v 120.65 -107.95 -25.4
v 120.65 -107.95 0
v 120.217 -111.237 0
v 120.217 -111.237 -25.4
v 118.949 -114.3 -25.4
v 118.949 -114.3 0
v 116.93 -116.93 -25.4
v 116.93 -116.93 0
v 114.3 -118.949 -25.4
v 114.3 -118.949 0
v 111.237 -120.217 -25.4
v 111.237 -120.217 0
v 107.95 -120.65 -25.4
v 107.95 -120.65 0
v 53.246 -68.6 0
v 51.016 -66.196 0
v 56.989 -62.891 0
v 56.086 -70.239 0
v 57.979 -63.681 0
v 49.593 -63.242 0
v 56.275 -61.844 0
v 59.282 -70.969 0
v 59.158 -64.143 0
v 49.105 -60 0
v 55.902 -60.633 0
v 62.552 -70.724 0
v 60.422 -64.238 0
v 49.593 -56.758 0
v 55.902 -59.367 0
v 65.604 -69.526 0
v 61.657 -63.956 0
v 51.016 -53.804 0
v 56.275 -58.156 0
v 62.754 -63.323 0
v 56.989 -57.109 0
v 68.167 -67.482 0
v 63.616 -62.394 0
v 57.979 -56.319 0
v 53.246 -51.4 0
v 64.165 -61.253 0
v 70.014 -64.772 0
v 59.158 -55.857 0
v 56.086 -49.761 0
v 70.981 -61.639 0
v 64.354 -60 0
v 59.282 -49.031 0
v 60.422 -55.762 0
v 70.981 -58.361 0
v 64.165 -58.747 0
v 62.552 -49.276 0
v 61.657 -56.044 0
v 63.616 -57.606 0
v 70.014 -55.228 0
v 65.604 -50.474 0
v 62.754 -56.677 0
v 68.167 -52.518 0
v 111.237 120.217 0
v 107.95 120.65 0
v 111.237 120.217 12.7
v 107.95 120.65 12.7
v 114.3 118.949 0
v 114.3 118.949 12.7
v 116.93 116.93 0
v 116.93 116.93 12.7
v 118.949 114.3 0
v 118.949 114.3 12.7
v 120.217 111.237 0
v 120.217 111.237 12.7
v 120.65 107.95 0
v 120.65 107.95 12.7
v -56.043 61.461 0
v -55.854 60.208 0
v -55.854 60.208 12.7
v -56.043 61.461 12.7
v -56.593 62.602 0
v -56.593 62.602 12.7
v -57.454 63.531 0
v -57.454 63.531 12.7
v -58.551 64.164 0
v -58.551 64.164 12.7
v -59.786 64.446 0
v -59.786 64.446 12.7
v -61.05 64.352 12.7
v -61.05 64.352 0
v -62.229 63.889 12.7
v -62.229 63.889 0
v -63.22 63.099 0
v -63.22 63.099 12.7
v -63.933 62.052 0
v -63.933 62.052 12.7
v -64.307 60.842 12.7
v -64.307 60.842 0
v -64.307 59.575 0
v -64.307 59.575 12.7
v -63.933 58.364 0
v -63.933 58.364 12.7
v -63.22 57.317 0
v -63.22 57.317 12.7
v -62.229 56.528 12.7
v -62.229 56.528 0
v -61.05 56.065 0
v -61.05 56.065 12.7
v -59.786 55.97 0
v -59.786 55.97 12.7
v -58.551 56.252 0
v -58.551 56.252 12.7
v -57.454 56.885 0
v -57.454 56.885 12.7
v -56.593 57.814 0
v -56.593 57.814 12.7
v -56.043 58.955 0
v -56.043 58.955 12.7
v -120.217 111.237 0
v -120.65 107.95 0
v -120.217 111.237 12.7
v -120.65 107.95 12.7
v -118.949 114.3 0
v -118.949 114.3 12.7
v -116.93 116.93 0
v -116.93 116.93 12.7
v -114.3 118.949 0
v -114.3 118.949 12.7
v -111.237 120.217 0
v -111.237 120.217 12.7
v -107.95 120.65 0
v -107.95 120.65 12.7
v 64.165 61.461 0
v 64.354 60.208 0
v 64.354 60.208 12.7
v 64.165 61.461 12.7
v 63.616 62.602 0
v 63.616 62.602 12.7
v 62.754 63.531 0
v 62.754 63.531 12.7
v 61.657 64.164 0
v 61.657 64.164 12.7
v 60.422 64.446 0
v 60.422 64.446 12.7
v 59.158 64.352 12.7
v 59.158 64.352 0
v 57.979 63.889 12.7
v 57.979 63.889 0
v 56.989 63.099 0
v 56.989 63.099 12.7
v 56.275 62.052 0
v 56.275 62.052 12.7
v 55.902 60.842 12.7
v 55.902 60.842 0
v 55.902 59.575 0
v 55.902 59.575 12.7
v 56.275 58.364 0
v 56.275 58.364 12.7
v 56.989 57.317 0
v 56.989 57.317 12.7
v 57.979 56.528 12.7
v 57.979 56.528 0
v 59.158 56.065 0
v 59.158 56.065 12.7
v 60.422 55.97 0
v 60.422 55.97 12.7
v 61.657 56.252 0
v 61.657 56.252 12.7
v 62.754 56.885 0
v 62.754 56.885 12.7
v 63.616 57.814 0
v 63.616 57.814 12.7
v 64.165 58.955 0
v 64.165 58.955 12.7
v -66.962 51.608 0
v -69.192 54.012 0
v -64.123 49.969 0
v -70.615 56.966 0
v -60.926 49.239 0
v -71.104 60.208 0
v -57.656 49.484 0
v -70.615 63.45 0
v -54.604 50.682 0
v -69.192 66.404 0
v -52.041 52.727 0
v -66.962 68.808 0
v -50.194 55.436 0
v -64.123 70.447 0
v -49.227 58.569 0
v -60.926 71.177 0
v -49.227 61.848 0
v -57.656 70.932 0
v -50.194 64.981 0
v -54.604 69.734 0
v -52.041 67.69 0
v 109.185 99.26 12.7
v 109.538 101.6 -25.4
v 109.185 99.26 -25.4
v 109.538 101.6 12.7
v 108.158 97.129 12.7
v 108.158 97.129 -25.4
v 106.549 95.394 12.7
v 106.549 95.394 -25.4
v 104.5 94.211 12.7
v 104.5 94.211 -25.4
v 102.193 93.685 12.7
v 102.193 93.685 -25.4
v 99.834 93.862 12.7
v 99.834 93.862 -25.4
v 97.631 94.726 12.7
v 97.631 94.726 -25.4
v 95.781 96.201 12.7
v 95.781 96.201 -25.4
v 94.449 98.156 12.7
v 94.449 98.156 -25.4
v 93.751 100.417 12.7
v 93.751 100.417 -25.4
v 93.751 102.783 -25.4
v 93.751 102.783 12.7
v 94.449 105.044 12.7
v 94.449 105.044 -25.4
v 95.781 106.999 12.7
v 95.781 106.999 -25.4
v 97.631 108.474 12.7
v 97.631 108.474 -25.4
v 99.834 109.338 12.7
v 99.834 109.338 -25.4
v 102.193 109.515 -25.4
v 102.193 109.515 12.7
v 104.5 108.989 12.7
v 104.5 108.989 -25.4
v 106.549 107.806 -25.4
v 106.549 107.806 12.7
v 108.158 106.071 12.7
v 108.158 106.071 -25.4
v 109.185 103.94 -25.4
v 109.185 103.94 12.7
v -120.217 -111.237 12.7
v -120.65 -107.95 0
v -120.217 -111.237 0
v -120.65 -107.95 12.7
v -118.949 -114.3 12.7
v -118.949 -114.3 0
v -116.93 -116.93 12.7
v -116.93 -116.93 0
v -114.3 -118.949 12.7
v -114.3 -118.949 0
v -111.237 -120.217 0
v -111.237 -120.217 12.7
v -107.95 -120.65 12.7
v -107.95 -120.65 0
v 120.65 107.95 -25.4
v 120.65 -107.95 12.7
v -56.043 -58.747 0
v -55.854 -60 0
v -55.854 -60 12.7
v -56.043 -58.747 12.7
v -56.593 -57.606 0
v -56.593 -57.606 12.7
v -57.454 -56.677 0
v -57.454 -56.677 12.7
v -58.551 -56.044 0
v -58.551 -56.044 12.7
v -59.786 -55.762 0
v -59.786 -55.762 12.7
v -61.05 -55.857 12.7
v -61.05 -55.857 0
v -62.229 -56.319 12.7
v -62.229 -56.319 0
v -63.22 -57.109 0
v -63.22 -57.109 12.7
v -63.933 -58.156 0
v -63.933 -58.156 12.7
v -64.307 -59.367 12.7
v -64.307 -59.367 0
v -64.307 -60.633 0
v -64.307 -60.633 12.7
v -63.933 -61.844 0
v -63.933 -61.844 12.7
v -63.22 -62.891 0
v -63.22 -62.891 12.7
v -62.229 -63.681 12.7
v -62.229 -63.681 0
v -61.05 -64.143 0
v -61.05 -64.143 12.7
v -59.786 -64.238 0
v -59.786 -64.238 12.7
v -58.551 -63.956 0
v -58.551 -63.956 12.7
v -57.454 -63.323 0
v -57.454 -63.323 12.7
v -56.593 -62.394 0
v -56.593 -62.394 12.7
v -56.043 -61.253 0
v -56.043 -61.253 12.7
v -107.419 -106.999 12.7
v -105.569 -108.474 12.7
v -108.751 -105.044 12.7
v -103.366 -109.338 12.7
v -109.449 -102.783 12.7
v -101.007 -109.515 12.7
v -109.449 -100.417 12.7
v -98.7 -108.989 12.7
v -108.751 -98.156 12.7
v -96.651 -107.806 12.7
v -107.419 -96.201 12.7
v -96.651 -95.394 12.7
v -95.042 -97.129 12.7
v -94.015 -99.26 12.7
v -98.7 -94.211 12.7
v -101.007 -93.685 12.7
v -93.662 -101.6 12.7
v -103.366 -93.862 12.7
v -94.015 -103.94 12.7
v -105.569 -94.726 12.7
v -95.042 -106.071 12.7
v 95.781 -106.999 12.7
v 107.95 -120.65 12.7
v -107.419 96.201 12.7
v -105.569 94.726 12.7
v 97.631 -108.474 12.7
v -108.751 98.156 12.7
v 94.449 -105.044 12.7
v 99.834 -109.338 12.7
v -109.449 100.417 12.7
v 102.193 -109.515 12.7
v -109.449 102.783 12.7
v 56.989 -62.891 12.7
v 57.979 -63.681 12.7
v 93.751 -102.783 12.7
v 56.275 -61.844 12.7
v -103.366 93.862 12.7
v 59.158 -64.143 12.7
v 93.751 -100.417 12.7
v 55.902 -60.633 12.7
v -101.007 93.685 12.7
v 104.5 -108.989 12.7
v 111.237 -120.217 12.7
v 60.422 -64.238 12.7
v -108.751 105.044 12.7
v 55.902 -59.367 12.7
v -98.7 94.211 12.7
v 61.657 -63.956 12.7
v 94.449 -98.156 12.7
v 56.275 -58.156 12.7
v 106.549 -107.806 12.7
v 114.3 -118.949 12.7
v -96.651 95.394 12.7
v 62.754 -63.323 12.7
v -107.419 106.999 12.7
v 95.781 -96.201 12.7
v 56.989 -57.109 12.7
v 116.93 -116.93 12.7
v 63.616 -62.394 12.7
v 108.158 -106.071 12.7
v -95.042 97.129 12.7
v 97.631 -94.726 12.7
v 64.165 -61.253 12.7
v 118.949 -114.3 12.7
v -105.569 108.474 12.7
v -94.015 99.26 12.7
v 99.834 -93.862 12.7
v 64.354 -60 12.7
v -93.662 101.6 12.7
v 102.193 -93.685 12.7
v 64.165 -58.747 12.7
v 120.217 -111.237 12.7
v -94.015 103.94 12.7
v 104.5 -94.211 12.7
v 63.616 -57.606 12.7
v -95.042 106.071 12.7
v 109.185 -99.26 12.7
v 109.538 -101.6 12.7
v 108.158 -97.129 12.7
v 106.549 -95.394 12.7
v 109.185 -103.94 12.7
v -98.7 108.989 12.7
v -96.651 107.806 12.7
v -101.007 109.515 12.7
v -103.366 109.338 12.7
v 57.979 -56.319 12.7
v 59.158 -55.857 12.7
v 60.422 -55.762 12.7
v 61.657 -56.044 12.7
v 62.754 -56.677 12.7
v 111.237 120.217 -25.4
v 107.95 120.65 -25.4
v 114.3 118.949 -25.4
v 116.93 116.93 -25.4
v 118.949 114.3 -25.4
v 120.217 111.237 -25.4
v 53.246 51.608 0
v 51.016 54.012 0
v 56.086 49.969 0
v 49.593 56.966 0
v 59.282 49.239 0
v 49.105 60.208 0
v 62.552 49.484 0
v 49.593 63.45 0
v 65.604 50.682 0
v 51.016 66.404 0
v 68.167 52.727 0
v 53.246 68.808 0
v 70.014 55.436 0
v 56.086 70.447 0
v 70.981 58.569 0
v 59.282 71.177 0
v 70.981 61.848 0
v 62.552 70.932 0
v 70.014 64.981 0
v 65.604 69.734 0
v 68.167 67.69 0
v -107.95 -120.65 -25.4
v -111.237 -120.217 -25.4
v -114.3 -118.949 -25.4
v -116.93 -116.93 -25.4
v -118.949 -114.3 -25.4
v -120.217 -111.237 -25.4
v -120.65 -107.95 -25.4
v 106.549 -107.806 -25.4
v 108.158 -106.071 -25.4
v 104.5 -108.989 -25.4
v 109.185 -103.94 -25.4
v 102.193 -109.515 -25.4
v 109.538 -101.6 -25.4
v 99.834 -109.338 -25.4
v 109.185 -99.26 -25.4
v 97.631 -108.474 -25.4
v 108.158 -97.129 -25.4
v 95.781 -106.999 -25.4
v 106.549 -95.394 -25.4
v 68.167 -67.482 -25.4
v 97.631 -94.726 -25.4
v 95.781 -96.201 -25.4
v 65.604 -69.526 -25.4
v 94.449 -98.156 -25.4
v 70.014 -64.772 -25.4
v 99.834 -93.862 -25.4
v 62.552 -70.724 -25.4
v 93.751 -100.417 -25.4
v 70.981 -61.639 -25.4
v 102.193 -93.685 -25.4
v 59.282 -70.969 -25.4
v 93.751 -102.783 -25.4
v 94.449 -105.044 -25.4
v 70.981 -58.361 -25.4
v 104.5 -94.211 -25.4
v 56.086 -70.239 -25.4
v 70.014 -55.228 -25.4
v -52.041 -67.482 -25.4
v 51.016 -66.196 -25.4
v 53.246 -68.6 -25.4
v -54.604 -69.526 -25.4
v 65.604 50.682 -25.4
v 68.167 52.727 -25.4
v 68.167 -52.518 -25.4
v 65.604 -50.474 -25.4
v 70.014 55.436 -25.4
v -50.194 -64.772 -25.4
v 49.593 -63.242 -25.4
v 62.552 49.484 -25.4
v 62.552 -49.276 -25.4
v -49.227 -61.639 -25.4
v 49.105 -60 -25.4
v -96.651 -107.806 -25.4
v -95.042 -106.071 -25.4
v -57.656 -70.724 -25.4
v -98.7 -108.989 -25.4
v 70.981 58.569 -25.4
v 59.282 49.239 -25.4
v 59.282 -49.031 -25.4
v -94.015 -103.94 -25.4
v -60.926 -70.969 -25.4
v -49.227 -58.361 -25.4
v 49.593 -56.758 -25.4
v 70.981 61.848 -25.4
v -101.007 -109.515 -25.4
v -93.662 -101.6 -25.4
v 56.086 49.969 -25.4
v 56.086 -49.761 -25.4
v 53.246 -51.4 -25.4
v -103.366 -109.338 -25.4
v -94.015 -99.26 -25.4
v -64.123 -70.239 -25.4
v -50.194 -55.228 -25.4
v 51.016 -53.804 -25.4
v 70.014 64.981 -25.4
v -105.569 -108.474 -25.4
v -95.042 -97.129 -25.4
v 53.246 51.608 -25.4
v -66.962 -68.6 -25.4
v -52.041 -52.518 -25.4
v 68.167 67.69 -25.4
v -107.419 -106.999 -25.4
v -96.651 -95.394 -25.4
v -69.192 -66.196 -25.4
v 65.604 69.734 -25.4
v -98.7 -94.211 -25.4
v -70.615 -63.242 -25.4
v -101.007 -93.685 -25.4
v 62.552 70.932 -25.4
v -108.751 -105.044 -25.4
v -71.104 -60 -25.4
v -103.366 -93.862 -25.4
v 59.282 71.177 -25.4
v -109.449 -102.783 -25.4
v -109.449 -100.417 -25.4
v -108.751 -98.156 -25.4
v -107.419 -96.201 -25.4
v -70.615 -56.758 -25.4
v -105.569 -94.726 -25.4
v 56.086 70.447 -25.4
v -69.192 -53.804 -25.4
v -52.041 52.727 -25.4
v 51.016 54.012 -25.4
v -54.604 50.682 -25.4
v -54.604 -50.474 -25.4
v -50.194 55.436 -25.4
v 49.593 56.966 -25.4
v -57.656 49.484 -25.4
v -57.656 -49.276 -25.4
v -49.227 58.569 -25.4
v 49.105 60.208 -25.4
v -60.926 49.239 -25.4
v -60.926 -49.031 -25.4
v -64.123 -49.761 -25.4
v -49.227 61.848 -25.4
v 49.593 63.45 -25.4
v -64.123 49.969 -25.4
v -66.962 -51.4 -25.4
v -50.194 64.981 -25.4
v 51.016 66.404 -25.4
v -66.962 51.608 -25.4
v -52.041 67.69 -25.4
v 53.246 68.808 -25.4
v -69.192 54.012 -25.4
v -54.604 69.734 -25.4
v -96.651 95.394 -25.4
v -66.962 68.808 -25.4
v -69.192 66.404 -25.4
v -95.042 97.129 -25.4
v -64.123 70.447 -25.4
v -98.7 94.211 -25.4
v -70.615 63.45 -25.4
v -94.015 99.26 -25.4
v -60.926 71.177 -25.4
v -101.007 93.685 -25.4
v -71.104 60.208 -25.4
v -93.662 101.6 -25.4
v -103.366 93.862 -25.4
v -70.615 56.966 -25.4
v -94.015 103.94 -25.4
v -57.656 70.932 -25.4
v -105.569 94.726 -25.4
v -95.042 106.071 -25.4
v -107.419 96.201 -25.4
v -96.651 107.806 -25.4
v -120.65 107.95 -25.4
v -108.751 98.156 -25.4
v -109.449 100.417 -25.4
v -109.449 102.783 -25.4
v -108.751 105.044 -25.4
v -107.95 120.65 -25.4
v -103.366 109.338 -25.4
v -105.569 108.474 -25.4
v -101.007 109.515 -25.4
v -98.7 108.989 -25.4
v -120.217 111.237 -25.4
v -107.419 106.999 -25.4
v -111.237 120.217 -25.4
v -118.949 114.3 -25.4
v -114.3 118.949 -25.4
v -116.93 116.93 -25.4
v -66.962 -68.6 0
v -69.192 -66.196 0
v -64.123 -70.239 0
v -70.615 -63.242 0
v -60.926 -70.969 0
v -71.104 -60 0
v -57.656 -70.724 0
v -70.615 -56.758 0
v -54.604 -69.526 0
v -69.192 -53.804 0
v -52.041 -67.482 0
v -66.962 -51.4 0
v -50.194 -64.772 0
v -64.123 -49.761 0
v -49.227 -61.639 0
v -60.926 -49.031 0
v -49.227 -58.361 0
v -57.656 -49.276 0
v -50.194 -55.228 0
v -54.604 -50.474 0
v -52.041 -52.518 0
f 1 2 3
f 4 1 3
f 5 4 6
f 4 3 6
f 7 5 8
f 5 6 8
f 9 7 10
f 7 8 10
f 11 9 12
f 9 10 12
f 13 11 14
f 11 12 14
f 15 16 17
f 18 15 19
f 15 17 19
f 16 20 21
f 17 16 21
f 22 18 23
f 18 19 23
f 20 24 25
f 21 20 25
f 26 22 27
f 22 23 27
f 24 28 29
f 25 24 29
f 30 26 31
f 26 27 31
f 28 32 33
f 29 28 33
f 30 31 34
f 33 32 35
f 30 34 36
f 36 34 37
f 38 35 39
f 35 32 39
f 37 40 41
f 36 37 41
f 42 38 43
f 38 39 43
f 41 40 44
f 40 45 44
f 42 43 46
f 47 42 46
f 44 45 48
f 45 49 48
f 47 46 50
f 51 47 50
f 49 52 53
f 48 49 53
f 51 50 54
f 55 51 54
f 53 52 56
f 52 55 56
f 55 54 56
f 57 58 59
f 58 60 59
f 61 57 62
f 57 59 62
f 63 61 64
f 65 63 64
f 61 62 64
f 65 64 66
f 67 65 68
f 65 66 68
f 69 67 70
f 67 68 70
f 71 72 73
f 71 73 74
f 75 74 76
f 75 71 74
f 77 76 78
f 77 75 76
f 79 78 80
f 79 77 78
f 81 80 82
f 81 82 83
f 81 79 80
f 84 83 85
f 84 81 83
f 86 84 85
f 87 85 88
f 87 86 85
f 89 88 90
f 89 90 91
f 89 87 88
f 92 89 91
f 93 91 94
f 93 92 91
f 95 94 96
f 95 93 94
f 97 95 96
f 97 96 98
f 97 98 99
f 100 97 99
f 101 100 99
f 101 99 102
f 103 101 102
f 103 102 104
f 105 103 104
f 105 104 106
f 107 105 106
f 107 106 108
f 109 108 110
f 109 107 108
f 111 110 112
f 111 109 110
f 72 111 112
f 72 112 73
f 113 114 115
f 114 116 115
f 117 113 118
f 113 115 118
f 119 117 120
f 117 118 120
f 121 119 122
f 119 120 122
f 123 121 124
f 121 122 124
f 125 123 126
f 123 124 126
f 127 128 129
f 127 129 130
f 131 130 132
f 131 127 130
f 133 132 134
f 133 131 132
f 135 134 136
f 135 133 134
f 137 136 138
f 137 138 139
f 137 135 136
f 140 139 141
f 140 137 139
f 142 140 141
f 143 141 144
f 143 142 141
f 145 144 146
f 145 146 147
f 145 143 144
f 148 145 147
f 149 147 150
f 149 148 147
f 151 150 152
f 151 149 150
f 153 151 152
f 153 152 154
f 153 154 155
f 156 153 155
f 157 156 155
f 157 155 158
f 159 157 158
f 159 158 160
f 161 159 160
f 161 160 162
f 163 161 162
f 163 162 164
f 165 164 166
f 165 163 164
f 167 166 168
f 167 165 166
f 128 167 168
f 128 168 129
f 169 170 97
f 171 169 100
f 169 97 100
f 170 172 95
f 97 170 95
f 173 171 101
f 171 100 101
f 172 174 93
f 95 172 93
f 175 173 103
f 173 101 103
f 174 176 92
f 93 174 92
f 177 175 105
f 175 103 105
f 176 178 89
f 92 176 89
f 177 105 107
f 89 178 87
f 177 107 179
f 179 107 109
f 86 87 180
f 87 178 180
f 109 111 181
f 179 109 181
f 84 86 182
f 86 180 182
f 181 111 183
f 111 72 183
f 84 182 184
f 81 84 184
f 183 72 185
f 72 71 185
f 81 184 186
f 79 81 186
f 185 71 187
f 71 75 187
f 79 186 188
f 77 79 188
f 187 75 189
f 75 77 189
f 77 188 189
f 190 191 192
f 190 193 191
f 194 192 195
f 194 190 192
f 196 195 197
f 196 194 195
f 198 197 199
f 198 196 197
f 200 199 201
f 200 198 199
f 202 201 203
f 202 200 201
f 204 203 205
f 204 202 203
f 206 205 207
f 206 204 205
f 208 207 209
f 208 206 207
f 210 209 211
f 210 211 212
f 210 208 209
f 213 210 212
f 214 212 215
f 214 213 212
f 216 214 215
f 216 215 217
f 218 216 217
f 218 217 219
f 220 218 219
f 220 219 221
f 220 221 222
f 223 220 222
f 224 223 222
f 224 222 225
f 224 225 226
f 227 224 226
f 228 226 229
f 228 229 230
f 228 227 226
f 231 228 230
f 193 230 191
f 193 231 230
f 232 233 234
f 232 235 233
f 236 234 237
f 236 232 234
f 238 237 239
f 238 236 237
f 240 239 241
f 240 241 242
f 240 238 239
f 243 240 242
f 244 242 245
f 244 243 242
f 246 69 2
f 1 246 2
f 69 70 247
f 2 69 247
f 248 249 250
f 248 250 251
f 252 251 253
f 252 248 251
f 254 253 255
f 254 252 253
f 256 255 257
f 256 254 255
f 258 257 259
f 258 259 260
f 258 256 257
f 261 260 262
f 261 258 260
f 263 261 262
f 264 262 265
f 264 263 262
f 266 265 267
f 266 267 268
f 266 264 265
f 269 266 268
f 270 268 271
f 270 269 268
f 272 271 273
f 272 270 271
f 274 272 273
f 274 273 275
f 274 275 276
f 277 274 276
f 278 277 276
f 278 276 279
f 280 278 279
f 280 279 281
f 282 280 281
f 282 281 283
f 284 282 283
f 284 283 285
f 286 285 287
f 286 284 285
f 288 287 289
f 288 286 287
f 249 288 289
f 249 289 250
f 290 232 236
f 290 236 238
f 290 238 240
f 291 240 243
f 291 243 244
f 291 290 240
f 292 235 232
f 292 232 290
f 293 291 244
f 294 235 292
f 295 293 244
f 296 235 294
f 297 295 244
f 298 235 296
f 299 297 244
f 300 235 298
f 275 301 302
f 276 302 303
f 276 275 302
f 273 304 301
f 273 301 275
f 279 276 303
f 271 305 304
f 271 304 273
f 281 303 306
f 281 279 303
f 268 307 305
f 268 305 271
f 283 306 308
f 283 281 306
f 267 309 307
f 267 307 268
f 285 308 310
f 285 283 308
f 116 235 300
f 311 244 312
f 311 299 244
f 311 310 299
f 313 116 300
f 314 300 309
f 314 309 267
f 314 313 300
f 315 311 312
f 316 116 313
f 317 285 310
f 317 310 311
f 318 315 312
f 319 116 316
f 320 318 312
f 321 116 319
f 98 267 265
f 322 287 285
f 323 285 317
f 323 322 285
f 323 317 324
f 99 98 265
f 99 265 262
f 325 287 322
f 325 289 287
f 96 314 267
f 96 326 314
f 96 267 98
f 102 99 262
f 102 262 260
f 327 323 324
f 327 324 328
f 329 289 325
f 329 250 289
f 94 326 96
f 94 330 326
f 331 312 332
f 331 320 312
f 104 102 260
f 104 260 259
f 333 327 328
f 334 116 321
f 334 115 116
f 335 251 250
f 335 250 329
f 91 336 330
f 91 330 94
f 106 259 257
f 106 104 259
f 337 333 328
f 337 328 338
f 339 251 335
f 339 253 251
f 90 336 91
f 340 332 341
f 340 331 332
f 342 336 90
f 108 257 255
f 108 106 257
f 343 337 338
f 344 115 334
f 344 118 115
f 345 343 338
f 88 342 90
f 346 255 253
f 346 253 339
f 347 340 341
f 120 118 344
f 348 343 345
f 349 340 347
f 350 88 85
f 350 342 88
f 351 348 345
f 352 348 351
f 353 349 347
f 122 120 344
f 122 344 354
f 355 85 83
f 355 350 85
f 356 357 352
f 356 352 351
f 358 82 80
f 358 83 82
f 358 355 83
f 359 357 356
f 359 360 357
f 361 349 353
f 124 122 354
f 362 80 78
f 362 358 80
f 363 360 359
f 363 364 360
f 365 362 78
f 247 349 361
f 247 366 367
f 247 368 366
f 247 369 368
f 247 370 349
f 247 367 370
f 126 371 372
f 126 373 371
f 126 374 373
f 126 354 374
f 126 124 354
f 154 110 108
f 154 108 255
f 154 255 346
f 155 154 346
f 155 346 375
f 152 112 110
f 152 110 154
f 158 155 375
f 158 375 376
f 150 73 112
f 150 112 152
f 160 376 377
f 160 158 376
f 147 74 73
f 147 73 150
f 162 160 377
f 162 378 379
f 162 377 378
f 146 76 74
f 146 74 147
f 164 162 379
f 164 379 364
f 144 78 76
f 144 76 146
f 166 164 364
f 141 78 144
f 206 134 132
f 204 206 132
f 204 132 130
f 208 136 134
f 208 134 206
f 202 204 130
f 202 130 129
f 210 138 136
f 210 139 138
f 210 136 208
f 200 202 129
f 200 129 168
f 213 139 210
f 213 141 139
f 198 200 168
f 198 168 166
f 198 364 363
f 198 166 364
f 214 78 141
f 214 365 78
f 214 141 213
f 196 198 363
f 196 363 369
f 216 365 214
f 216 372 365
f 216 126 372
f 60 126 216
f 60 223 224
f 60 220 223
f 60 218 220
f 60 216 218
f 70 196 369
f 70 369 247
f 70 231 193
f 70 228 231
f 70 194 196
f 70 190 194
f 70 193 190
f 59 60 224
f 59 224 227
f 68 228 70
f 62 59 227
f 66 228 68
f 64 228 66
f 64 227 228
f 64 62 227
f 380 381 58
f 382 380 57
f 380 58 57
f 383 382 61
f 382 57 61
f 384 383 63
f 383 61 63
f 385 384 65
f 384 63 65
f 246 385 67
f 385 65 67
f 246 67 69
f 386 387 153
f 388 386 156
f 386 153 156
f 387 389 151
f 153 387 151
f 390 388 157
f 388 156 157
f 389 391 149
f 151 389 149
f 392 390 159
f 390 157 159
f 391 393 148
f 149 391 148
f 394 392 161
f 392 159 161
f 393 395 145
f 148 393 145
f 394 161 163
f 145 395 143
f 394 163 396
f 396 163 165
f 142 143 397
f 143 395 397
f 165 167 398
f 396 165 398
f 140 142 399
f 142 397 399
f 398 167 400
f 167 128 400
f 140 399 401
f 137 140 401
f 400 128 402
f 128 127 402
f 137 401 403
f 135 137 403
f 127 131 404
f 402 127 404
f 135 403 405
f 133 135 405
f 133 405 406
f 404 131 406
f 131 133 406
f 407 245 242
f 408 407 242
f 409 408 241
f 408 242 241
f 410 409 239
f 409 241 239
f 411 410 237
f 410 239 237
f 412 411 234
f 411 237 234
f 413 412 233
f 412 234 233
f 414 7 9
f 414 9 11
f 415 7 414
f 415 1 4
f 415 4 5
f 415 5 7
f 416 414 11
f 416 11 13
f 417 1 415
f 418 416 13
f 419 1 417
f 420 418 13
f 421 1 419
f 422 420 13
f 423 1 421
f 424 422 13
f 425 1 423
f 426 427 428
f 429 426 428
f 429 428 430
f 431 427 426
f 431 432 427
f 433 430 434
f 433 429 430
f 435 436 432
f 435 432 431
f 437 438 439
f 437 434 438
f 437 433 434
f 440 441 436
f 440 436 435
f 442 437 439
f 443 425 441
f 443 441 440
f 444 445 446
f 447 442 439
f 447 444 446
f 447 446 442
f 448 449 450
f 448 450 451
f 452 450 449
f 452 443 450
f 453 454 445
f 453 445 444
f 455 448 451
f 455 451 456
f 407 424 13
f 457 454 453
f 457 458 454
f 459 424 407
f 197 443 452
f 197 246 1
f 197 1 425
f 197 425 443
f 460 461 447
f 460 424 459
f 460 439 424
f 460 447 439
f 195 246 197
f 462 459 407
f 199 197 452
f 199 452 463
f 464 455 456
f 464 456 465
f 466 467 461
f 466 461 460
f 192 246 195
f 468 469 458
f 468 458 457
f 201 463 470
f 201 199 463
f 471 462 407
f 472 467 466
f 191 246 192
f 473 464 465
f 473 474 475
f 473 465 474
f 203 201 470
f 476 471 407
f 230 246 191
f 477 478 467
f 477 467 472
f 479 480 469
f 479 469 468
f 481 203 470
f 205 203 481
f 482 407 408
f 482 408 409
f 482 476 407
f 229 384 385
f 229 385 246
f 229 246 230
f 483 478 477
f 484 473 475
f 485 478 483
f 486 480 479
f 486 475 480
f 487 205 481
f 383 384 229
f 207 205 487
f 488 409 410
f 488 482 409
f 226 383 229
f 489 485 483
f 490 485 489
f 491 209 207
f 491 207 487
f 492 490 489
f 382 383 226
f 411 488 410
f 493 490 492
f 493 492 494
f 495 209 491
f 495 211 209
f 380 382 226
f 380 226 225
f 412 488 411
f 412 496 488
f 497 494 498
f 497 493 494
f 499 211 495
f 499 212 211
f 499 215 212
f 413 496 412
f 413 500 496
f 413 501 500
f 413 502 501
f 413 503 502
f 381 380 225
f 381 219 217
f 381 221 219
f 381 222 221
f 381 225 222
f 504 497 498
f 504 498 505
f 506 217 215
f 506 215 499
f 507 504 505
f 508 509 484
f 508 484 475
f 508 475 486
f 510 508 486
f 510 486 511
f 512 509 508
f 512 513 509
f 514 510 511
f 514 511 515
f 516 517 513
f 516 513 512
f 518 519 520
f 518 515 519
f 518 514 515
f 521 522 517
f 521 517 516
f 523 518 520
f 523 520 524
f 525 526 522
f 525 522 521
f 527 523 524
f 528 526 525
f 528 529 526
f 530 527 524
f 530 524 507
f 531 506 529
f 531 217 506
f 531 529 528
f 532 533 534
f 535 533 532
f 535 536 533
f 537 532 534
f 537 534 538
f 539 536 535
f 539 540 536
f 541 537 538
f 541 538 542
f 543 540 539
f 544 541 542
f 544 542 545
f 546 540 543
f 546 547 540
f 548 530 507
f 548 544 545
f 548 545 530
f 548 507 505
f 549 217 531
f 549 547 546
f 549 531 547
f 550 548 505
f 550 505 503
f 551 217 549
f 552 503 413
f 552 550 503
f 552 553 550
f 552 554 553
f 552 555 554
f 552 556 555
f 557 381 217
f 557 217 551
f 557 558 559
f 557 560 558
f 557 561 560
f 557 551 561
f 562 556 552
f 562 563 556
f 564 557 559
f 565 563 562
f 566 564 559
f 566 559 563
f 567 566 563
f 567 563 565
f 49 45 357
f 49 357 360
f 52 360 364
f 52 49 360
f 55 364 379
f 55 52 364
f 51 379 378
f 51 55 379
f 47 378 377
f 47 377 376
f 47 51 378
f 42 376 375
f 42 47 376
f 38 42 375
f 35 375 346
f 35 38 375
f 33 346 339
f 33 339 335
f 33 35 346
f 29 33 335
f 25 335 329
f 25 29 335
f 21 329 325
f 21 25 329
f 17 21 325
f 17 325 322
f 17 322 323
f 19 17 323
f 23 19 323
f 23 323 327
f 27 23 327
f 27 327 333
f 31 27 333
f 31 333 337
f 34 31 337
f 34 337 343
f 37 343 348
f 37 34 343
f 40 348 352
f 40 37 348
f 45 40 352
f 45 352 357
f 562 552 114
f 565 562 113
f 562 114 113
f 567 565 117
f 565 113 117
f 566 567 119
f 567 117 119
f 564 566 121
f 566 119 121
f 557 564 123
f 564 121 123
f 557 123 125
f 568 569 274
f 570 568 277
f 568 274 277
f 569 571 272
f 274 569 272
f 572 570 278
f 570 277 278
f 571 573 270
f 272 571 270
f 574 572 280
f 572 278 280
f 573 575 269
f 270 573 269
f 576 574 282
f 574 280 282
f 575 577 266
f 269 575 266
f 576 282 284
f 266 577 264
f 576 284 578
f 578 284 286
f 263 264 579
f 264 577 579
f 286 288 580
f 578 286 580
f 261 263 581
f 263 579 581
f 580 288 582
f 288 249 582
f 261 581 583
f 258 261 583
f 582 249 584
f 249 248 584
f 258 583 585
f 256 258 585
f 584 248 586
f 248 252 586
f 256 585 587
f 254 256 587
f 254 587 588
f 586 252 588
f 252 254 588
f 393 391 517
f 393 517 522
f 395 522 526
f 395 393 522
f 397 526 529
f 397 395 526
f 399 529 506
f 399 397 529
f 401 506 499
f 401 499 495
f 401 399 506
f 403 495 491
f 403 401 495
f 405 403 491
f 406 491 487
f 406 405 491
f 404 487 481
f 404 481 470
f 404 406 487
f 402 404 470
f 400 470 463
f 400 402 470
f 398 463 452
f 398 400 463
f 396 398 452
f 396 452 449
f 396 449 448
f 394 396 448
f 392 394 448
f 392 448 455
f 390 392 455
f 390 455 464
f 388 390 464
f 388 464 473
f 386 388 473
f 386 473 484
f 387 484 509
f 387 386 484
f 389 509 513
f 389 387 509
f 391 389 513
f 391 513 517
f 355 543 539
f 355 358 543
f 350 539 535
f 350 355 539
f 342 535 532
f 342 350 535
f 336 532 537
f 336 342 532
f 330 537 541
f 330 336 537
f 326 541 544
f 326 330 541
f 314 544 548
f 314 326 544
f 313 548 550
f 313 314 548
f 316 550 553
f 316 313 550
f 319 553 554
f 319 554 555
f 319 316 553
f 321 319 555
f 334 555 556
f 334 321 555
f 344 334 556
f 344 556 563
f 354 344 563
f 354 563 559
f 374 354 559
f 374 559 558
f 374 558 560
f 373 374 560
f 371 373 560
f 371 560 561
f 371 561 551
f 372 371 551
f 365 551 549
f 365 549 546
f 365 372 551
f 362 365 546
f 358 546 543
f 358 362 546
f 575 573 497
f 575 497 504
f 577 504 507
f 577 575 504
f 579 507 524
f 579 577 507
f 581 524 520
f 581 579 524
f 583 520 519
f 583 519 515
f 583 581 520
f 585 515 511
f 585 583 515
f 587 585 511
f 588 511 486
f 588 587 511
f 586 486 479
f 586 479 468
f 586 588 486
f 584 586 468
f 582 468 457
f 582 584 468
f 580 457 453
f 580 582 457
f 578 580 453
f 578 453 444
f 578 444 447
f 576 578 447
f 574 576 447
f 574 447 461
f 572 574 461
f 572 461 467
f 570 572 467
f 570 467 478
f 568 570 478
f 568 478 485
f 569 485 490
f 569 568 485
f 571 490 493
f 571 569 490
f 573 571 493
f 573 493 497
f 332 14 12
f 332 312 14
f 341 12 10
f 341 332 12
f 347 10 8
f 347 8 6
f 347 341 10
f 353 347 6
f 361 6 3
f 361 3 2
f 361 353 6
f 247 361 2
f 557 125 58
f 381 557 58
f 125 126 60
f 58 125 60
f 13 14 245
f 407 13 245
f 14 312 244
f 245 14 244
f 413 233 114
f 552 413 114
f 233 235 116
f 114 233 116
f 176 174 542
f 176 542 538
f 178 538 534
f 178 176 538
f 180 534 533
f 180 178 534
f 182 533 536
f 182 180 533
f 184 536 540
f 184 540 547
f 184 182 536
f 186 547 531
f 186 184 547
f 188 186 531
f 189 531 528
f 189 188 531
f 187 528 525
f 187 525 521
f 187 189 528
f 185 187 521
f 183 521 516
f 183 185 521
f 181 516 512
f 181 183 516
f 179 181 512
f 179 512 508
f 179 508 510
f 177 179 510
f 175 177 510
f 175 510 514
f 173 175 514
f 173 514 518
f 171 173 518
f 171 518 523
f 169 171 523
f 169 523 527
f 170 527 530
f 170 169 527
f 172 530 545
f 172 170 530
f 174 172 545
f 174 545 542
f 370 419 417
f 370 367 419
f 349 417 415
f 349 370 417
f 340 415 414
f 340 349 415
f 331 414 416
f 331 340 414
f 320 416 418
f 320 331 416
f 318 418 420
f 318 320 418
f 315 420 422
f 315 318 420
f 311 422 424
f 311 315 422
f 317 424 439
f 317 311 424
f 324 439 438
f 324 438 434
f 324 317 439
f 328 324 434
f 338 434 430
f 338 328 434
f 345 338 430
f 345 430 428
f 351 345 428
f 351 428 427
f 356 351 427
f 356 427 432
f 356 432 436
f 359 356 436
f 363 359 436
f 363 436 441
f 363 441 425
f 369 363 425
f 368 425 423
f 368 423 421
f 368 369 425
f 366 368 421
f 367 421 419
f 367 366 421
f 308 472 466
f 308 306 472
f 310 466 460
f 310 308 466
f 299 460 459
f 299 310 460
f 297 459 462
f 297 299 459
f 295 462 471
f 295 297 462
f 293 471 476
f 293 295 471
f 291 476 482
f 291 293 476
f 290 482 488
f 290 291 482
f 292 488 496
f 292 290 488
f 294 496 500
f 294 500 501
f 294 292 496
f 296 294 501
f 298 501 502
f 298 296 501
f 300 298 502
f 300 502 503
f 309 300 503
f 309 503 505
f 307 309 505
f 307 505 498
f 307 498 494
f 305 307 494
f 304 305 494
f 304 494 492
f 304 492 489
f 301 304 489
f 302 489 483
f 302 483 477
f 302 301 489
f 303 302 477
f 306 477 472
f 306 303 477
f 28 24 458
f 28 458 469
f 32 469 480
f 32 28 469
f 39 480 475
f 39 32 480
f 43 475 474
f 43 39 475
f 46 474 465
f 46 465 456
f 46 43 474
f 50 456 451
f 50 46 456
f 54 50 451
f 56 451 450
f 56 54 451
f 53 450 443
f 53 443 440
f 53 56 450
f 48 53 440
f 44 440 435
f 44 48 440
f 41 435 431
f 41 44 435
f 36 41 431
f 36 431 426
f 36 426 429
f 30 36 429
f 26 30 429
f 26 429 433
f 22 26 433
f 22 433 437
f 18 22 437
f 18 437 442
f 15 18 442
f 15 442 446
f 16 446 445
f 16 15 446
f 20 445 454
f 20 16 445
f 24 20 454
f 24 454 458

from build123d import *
from build123d.topology import SkipClean

# Parameters (mm, degrees)
SKETCH3_W           = 241.3
SKETCH3_H           = 241.3
SKETCH3_R           = 4.25
BOSS_EXTRUDE1_DEPTH = 12.7
SKETCH4_R           = 7.9375
CUT_EXTRUDE1_DEPTH  = 172.096858533
FILLET1_R           = 12.7
SKETCH5_R           = 7.9375
SKETCH5_R_2         = 10.99947
BOSS_EXTRUDE2_DEPTH = 25.4


with BuildPart() as part:
    # Sketch3 → Boss-Extrude1 (new body)
    with BuildSketch(Plane.XY):
        Rectangle(SKETCH3_W, SKETCH3_H)
        with Locations((-60.104076401, 60.208152802)):
            Circle(SKETCH3_R, mode=Mode.SUBTRACT)
        with Locations((60.104076401, 60.208152802)):
            Circle(SKETCH3_R, mode=Mode.SUBTRACT)
        with Locations((60.104076401, -60)):
            Circle(SKETCH3_R, mode=Mode.SUBTRACT)
        with Locations((-60.104076401, -60)):
            Circle(SKETCH3_R, mode=Mode.SUBTRACT)
    extrude(amount=BOSS_EXTRUDE1_DEPTH)

    # Sketch4 → Cut-Extrude1 (cut, through all)
    with BuildSketch(Plane.XY.offset(12.7)):
        with Locations((-101.6, -101.6)):
            Circle(SKETCH4_R)
        with Locations((101.6, -101.6)):
            Circle(SKETCH4_R)
        with Locations((101.6, 101.6)):
            Circle(SKETCH4_R)
        with Locations((-101.6, 101.6)):
            Circle(SKETCH4_R)
    extrude(amount=-CUT_EXTRUDE1_DEPTH, mode=Mode.SUBTRACT)

    # Fillet1
    fillet1_edges = [part.edges().sort_by_distance(p)[0] for p in [
        (-120.65, -120.65, 6.35),
        (-120.65, 120.65, 6.35),
        (120.65, 120.65, 6.35),
        (120.65, -120.65, 6.35),
    ]]
    fillet(fillet1_edges, radius=FILLET1_R)

    # Sketch5 → Boss-Extrude2 (add)
    with SkipClean():  # the faces are left unmerged after this step: merging them gives an invalid solid
        with BuildSketch(Plane(origin=(0, 0, 0), x_dir=(-1, 0, 0), z_dir=(0, 0, -1))):
            with BuildLine():
                Line((-107.95, -120.65), (107.95, -120.65))
                ThreePointArc((107.95, -120.65), (116.930256121, -116.930256121), (120.65, -107.95))
                Line((120.65, -107.95), (120.65, 107.95))
                ThreePointArc((120.65, 107.95), (116.930256121, 116.930256121), (107.95, 120.65))
                Line((107.95, 120.65), (-107.95, 120.65))
                ThreePointArc((-107.95, 120.65), (-116.930256121, 116.930256121), (-120.65, 107.95))
                Line((-120.65, 107.95), (-120.65, -107.95))
                ThreePointArc((-120.65, -107.95), (-116.930256121, -116.930256121), (-107.95, -120.65))
            make_face()
            with Locations((101.6, 101.6)):
                Circle(SKETCH5_R, mode=Mode.SUBTRACT)
            with Locations((101.6, -101.6)):
                Circle(SKETCH5_R, mode=Mode.SUBTRACT)
            with Locations((-101.6, -101.6)):
                Circle(SKETCH5_R, mode=Mode.SUBTRACT)
            with Locations((-101.6, 101.6)):
                Circle(SKETCH5_R, mode=Mode.SUBTRACT)
            with Locations((-60.104076401, 60.208152802)):
                Circle(SKETCH5_R_2, mode=Mode.SUBTRACT)
            with Locations((60.104076401, 60.208152802)):
                Circle(SKETCH5_R_2, mode=Mode.SUBTRACT)
            with Locations((60.104076401, -60)):
                Circle(SKETCH5_R_2, mode=Mode.SUBTRACT)
            with Locations((-60.104076401, -60)):
                Circle(SKETCH5_R_2, mode=Mode.SUBTRACT)
        extrude(amount=BOSS_EXTRUDE2_DEPTH)


solid = part.part
